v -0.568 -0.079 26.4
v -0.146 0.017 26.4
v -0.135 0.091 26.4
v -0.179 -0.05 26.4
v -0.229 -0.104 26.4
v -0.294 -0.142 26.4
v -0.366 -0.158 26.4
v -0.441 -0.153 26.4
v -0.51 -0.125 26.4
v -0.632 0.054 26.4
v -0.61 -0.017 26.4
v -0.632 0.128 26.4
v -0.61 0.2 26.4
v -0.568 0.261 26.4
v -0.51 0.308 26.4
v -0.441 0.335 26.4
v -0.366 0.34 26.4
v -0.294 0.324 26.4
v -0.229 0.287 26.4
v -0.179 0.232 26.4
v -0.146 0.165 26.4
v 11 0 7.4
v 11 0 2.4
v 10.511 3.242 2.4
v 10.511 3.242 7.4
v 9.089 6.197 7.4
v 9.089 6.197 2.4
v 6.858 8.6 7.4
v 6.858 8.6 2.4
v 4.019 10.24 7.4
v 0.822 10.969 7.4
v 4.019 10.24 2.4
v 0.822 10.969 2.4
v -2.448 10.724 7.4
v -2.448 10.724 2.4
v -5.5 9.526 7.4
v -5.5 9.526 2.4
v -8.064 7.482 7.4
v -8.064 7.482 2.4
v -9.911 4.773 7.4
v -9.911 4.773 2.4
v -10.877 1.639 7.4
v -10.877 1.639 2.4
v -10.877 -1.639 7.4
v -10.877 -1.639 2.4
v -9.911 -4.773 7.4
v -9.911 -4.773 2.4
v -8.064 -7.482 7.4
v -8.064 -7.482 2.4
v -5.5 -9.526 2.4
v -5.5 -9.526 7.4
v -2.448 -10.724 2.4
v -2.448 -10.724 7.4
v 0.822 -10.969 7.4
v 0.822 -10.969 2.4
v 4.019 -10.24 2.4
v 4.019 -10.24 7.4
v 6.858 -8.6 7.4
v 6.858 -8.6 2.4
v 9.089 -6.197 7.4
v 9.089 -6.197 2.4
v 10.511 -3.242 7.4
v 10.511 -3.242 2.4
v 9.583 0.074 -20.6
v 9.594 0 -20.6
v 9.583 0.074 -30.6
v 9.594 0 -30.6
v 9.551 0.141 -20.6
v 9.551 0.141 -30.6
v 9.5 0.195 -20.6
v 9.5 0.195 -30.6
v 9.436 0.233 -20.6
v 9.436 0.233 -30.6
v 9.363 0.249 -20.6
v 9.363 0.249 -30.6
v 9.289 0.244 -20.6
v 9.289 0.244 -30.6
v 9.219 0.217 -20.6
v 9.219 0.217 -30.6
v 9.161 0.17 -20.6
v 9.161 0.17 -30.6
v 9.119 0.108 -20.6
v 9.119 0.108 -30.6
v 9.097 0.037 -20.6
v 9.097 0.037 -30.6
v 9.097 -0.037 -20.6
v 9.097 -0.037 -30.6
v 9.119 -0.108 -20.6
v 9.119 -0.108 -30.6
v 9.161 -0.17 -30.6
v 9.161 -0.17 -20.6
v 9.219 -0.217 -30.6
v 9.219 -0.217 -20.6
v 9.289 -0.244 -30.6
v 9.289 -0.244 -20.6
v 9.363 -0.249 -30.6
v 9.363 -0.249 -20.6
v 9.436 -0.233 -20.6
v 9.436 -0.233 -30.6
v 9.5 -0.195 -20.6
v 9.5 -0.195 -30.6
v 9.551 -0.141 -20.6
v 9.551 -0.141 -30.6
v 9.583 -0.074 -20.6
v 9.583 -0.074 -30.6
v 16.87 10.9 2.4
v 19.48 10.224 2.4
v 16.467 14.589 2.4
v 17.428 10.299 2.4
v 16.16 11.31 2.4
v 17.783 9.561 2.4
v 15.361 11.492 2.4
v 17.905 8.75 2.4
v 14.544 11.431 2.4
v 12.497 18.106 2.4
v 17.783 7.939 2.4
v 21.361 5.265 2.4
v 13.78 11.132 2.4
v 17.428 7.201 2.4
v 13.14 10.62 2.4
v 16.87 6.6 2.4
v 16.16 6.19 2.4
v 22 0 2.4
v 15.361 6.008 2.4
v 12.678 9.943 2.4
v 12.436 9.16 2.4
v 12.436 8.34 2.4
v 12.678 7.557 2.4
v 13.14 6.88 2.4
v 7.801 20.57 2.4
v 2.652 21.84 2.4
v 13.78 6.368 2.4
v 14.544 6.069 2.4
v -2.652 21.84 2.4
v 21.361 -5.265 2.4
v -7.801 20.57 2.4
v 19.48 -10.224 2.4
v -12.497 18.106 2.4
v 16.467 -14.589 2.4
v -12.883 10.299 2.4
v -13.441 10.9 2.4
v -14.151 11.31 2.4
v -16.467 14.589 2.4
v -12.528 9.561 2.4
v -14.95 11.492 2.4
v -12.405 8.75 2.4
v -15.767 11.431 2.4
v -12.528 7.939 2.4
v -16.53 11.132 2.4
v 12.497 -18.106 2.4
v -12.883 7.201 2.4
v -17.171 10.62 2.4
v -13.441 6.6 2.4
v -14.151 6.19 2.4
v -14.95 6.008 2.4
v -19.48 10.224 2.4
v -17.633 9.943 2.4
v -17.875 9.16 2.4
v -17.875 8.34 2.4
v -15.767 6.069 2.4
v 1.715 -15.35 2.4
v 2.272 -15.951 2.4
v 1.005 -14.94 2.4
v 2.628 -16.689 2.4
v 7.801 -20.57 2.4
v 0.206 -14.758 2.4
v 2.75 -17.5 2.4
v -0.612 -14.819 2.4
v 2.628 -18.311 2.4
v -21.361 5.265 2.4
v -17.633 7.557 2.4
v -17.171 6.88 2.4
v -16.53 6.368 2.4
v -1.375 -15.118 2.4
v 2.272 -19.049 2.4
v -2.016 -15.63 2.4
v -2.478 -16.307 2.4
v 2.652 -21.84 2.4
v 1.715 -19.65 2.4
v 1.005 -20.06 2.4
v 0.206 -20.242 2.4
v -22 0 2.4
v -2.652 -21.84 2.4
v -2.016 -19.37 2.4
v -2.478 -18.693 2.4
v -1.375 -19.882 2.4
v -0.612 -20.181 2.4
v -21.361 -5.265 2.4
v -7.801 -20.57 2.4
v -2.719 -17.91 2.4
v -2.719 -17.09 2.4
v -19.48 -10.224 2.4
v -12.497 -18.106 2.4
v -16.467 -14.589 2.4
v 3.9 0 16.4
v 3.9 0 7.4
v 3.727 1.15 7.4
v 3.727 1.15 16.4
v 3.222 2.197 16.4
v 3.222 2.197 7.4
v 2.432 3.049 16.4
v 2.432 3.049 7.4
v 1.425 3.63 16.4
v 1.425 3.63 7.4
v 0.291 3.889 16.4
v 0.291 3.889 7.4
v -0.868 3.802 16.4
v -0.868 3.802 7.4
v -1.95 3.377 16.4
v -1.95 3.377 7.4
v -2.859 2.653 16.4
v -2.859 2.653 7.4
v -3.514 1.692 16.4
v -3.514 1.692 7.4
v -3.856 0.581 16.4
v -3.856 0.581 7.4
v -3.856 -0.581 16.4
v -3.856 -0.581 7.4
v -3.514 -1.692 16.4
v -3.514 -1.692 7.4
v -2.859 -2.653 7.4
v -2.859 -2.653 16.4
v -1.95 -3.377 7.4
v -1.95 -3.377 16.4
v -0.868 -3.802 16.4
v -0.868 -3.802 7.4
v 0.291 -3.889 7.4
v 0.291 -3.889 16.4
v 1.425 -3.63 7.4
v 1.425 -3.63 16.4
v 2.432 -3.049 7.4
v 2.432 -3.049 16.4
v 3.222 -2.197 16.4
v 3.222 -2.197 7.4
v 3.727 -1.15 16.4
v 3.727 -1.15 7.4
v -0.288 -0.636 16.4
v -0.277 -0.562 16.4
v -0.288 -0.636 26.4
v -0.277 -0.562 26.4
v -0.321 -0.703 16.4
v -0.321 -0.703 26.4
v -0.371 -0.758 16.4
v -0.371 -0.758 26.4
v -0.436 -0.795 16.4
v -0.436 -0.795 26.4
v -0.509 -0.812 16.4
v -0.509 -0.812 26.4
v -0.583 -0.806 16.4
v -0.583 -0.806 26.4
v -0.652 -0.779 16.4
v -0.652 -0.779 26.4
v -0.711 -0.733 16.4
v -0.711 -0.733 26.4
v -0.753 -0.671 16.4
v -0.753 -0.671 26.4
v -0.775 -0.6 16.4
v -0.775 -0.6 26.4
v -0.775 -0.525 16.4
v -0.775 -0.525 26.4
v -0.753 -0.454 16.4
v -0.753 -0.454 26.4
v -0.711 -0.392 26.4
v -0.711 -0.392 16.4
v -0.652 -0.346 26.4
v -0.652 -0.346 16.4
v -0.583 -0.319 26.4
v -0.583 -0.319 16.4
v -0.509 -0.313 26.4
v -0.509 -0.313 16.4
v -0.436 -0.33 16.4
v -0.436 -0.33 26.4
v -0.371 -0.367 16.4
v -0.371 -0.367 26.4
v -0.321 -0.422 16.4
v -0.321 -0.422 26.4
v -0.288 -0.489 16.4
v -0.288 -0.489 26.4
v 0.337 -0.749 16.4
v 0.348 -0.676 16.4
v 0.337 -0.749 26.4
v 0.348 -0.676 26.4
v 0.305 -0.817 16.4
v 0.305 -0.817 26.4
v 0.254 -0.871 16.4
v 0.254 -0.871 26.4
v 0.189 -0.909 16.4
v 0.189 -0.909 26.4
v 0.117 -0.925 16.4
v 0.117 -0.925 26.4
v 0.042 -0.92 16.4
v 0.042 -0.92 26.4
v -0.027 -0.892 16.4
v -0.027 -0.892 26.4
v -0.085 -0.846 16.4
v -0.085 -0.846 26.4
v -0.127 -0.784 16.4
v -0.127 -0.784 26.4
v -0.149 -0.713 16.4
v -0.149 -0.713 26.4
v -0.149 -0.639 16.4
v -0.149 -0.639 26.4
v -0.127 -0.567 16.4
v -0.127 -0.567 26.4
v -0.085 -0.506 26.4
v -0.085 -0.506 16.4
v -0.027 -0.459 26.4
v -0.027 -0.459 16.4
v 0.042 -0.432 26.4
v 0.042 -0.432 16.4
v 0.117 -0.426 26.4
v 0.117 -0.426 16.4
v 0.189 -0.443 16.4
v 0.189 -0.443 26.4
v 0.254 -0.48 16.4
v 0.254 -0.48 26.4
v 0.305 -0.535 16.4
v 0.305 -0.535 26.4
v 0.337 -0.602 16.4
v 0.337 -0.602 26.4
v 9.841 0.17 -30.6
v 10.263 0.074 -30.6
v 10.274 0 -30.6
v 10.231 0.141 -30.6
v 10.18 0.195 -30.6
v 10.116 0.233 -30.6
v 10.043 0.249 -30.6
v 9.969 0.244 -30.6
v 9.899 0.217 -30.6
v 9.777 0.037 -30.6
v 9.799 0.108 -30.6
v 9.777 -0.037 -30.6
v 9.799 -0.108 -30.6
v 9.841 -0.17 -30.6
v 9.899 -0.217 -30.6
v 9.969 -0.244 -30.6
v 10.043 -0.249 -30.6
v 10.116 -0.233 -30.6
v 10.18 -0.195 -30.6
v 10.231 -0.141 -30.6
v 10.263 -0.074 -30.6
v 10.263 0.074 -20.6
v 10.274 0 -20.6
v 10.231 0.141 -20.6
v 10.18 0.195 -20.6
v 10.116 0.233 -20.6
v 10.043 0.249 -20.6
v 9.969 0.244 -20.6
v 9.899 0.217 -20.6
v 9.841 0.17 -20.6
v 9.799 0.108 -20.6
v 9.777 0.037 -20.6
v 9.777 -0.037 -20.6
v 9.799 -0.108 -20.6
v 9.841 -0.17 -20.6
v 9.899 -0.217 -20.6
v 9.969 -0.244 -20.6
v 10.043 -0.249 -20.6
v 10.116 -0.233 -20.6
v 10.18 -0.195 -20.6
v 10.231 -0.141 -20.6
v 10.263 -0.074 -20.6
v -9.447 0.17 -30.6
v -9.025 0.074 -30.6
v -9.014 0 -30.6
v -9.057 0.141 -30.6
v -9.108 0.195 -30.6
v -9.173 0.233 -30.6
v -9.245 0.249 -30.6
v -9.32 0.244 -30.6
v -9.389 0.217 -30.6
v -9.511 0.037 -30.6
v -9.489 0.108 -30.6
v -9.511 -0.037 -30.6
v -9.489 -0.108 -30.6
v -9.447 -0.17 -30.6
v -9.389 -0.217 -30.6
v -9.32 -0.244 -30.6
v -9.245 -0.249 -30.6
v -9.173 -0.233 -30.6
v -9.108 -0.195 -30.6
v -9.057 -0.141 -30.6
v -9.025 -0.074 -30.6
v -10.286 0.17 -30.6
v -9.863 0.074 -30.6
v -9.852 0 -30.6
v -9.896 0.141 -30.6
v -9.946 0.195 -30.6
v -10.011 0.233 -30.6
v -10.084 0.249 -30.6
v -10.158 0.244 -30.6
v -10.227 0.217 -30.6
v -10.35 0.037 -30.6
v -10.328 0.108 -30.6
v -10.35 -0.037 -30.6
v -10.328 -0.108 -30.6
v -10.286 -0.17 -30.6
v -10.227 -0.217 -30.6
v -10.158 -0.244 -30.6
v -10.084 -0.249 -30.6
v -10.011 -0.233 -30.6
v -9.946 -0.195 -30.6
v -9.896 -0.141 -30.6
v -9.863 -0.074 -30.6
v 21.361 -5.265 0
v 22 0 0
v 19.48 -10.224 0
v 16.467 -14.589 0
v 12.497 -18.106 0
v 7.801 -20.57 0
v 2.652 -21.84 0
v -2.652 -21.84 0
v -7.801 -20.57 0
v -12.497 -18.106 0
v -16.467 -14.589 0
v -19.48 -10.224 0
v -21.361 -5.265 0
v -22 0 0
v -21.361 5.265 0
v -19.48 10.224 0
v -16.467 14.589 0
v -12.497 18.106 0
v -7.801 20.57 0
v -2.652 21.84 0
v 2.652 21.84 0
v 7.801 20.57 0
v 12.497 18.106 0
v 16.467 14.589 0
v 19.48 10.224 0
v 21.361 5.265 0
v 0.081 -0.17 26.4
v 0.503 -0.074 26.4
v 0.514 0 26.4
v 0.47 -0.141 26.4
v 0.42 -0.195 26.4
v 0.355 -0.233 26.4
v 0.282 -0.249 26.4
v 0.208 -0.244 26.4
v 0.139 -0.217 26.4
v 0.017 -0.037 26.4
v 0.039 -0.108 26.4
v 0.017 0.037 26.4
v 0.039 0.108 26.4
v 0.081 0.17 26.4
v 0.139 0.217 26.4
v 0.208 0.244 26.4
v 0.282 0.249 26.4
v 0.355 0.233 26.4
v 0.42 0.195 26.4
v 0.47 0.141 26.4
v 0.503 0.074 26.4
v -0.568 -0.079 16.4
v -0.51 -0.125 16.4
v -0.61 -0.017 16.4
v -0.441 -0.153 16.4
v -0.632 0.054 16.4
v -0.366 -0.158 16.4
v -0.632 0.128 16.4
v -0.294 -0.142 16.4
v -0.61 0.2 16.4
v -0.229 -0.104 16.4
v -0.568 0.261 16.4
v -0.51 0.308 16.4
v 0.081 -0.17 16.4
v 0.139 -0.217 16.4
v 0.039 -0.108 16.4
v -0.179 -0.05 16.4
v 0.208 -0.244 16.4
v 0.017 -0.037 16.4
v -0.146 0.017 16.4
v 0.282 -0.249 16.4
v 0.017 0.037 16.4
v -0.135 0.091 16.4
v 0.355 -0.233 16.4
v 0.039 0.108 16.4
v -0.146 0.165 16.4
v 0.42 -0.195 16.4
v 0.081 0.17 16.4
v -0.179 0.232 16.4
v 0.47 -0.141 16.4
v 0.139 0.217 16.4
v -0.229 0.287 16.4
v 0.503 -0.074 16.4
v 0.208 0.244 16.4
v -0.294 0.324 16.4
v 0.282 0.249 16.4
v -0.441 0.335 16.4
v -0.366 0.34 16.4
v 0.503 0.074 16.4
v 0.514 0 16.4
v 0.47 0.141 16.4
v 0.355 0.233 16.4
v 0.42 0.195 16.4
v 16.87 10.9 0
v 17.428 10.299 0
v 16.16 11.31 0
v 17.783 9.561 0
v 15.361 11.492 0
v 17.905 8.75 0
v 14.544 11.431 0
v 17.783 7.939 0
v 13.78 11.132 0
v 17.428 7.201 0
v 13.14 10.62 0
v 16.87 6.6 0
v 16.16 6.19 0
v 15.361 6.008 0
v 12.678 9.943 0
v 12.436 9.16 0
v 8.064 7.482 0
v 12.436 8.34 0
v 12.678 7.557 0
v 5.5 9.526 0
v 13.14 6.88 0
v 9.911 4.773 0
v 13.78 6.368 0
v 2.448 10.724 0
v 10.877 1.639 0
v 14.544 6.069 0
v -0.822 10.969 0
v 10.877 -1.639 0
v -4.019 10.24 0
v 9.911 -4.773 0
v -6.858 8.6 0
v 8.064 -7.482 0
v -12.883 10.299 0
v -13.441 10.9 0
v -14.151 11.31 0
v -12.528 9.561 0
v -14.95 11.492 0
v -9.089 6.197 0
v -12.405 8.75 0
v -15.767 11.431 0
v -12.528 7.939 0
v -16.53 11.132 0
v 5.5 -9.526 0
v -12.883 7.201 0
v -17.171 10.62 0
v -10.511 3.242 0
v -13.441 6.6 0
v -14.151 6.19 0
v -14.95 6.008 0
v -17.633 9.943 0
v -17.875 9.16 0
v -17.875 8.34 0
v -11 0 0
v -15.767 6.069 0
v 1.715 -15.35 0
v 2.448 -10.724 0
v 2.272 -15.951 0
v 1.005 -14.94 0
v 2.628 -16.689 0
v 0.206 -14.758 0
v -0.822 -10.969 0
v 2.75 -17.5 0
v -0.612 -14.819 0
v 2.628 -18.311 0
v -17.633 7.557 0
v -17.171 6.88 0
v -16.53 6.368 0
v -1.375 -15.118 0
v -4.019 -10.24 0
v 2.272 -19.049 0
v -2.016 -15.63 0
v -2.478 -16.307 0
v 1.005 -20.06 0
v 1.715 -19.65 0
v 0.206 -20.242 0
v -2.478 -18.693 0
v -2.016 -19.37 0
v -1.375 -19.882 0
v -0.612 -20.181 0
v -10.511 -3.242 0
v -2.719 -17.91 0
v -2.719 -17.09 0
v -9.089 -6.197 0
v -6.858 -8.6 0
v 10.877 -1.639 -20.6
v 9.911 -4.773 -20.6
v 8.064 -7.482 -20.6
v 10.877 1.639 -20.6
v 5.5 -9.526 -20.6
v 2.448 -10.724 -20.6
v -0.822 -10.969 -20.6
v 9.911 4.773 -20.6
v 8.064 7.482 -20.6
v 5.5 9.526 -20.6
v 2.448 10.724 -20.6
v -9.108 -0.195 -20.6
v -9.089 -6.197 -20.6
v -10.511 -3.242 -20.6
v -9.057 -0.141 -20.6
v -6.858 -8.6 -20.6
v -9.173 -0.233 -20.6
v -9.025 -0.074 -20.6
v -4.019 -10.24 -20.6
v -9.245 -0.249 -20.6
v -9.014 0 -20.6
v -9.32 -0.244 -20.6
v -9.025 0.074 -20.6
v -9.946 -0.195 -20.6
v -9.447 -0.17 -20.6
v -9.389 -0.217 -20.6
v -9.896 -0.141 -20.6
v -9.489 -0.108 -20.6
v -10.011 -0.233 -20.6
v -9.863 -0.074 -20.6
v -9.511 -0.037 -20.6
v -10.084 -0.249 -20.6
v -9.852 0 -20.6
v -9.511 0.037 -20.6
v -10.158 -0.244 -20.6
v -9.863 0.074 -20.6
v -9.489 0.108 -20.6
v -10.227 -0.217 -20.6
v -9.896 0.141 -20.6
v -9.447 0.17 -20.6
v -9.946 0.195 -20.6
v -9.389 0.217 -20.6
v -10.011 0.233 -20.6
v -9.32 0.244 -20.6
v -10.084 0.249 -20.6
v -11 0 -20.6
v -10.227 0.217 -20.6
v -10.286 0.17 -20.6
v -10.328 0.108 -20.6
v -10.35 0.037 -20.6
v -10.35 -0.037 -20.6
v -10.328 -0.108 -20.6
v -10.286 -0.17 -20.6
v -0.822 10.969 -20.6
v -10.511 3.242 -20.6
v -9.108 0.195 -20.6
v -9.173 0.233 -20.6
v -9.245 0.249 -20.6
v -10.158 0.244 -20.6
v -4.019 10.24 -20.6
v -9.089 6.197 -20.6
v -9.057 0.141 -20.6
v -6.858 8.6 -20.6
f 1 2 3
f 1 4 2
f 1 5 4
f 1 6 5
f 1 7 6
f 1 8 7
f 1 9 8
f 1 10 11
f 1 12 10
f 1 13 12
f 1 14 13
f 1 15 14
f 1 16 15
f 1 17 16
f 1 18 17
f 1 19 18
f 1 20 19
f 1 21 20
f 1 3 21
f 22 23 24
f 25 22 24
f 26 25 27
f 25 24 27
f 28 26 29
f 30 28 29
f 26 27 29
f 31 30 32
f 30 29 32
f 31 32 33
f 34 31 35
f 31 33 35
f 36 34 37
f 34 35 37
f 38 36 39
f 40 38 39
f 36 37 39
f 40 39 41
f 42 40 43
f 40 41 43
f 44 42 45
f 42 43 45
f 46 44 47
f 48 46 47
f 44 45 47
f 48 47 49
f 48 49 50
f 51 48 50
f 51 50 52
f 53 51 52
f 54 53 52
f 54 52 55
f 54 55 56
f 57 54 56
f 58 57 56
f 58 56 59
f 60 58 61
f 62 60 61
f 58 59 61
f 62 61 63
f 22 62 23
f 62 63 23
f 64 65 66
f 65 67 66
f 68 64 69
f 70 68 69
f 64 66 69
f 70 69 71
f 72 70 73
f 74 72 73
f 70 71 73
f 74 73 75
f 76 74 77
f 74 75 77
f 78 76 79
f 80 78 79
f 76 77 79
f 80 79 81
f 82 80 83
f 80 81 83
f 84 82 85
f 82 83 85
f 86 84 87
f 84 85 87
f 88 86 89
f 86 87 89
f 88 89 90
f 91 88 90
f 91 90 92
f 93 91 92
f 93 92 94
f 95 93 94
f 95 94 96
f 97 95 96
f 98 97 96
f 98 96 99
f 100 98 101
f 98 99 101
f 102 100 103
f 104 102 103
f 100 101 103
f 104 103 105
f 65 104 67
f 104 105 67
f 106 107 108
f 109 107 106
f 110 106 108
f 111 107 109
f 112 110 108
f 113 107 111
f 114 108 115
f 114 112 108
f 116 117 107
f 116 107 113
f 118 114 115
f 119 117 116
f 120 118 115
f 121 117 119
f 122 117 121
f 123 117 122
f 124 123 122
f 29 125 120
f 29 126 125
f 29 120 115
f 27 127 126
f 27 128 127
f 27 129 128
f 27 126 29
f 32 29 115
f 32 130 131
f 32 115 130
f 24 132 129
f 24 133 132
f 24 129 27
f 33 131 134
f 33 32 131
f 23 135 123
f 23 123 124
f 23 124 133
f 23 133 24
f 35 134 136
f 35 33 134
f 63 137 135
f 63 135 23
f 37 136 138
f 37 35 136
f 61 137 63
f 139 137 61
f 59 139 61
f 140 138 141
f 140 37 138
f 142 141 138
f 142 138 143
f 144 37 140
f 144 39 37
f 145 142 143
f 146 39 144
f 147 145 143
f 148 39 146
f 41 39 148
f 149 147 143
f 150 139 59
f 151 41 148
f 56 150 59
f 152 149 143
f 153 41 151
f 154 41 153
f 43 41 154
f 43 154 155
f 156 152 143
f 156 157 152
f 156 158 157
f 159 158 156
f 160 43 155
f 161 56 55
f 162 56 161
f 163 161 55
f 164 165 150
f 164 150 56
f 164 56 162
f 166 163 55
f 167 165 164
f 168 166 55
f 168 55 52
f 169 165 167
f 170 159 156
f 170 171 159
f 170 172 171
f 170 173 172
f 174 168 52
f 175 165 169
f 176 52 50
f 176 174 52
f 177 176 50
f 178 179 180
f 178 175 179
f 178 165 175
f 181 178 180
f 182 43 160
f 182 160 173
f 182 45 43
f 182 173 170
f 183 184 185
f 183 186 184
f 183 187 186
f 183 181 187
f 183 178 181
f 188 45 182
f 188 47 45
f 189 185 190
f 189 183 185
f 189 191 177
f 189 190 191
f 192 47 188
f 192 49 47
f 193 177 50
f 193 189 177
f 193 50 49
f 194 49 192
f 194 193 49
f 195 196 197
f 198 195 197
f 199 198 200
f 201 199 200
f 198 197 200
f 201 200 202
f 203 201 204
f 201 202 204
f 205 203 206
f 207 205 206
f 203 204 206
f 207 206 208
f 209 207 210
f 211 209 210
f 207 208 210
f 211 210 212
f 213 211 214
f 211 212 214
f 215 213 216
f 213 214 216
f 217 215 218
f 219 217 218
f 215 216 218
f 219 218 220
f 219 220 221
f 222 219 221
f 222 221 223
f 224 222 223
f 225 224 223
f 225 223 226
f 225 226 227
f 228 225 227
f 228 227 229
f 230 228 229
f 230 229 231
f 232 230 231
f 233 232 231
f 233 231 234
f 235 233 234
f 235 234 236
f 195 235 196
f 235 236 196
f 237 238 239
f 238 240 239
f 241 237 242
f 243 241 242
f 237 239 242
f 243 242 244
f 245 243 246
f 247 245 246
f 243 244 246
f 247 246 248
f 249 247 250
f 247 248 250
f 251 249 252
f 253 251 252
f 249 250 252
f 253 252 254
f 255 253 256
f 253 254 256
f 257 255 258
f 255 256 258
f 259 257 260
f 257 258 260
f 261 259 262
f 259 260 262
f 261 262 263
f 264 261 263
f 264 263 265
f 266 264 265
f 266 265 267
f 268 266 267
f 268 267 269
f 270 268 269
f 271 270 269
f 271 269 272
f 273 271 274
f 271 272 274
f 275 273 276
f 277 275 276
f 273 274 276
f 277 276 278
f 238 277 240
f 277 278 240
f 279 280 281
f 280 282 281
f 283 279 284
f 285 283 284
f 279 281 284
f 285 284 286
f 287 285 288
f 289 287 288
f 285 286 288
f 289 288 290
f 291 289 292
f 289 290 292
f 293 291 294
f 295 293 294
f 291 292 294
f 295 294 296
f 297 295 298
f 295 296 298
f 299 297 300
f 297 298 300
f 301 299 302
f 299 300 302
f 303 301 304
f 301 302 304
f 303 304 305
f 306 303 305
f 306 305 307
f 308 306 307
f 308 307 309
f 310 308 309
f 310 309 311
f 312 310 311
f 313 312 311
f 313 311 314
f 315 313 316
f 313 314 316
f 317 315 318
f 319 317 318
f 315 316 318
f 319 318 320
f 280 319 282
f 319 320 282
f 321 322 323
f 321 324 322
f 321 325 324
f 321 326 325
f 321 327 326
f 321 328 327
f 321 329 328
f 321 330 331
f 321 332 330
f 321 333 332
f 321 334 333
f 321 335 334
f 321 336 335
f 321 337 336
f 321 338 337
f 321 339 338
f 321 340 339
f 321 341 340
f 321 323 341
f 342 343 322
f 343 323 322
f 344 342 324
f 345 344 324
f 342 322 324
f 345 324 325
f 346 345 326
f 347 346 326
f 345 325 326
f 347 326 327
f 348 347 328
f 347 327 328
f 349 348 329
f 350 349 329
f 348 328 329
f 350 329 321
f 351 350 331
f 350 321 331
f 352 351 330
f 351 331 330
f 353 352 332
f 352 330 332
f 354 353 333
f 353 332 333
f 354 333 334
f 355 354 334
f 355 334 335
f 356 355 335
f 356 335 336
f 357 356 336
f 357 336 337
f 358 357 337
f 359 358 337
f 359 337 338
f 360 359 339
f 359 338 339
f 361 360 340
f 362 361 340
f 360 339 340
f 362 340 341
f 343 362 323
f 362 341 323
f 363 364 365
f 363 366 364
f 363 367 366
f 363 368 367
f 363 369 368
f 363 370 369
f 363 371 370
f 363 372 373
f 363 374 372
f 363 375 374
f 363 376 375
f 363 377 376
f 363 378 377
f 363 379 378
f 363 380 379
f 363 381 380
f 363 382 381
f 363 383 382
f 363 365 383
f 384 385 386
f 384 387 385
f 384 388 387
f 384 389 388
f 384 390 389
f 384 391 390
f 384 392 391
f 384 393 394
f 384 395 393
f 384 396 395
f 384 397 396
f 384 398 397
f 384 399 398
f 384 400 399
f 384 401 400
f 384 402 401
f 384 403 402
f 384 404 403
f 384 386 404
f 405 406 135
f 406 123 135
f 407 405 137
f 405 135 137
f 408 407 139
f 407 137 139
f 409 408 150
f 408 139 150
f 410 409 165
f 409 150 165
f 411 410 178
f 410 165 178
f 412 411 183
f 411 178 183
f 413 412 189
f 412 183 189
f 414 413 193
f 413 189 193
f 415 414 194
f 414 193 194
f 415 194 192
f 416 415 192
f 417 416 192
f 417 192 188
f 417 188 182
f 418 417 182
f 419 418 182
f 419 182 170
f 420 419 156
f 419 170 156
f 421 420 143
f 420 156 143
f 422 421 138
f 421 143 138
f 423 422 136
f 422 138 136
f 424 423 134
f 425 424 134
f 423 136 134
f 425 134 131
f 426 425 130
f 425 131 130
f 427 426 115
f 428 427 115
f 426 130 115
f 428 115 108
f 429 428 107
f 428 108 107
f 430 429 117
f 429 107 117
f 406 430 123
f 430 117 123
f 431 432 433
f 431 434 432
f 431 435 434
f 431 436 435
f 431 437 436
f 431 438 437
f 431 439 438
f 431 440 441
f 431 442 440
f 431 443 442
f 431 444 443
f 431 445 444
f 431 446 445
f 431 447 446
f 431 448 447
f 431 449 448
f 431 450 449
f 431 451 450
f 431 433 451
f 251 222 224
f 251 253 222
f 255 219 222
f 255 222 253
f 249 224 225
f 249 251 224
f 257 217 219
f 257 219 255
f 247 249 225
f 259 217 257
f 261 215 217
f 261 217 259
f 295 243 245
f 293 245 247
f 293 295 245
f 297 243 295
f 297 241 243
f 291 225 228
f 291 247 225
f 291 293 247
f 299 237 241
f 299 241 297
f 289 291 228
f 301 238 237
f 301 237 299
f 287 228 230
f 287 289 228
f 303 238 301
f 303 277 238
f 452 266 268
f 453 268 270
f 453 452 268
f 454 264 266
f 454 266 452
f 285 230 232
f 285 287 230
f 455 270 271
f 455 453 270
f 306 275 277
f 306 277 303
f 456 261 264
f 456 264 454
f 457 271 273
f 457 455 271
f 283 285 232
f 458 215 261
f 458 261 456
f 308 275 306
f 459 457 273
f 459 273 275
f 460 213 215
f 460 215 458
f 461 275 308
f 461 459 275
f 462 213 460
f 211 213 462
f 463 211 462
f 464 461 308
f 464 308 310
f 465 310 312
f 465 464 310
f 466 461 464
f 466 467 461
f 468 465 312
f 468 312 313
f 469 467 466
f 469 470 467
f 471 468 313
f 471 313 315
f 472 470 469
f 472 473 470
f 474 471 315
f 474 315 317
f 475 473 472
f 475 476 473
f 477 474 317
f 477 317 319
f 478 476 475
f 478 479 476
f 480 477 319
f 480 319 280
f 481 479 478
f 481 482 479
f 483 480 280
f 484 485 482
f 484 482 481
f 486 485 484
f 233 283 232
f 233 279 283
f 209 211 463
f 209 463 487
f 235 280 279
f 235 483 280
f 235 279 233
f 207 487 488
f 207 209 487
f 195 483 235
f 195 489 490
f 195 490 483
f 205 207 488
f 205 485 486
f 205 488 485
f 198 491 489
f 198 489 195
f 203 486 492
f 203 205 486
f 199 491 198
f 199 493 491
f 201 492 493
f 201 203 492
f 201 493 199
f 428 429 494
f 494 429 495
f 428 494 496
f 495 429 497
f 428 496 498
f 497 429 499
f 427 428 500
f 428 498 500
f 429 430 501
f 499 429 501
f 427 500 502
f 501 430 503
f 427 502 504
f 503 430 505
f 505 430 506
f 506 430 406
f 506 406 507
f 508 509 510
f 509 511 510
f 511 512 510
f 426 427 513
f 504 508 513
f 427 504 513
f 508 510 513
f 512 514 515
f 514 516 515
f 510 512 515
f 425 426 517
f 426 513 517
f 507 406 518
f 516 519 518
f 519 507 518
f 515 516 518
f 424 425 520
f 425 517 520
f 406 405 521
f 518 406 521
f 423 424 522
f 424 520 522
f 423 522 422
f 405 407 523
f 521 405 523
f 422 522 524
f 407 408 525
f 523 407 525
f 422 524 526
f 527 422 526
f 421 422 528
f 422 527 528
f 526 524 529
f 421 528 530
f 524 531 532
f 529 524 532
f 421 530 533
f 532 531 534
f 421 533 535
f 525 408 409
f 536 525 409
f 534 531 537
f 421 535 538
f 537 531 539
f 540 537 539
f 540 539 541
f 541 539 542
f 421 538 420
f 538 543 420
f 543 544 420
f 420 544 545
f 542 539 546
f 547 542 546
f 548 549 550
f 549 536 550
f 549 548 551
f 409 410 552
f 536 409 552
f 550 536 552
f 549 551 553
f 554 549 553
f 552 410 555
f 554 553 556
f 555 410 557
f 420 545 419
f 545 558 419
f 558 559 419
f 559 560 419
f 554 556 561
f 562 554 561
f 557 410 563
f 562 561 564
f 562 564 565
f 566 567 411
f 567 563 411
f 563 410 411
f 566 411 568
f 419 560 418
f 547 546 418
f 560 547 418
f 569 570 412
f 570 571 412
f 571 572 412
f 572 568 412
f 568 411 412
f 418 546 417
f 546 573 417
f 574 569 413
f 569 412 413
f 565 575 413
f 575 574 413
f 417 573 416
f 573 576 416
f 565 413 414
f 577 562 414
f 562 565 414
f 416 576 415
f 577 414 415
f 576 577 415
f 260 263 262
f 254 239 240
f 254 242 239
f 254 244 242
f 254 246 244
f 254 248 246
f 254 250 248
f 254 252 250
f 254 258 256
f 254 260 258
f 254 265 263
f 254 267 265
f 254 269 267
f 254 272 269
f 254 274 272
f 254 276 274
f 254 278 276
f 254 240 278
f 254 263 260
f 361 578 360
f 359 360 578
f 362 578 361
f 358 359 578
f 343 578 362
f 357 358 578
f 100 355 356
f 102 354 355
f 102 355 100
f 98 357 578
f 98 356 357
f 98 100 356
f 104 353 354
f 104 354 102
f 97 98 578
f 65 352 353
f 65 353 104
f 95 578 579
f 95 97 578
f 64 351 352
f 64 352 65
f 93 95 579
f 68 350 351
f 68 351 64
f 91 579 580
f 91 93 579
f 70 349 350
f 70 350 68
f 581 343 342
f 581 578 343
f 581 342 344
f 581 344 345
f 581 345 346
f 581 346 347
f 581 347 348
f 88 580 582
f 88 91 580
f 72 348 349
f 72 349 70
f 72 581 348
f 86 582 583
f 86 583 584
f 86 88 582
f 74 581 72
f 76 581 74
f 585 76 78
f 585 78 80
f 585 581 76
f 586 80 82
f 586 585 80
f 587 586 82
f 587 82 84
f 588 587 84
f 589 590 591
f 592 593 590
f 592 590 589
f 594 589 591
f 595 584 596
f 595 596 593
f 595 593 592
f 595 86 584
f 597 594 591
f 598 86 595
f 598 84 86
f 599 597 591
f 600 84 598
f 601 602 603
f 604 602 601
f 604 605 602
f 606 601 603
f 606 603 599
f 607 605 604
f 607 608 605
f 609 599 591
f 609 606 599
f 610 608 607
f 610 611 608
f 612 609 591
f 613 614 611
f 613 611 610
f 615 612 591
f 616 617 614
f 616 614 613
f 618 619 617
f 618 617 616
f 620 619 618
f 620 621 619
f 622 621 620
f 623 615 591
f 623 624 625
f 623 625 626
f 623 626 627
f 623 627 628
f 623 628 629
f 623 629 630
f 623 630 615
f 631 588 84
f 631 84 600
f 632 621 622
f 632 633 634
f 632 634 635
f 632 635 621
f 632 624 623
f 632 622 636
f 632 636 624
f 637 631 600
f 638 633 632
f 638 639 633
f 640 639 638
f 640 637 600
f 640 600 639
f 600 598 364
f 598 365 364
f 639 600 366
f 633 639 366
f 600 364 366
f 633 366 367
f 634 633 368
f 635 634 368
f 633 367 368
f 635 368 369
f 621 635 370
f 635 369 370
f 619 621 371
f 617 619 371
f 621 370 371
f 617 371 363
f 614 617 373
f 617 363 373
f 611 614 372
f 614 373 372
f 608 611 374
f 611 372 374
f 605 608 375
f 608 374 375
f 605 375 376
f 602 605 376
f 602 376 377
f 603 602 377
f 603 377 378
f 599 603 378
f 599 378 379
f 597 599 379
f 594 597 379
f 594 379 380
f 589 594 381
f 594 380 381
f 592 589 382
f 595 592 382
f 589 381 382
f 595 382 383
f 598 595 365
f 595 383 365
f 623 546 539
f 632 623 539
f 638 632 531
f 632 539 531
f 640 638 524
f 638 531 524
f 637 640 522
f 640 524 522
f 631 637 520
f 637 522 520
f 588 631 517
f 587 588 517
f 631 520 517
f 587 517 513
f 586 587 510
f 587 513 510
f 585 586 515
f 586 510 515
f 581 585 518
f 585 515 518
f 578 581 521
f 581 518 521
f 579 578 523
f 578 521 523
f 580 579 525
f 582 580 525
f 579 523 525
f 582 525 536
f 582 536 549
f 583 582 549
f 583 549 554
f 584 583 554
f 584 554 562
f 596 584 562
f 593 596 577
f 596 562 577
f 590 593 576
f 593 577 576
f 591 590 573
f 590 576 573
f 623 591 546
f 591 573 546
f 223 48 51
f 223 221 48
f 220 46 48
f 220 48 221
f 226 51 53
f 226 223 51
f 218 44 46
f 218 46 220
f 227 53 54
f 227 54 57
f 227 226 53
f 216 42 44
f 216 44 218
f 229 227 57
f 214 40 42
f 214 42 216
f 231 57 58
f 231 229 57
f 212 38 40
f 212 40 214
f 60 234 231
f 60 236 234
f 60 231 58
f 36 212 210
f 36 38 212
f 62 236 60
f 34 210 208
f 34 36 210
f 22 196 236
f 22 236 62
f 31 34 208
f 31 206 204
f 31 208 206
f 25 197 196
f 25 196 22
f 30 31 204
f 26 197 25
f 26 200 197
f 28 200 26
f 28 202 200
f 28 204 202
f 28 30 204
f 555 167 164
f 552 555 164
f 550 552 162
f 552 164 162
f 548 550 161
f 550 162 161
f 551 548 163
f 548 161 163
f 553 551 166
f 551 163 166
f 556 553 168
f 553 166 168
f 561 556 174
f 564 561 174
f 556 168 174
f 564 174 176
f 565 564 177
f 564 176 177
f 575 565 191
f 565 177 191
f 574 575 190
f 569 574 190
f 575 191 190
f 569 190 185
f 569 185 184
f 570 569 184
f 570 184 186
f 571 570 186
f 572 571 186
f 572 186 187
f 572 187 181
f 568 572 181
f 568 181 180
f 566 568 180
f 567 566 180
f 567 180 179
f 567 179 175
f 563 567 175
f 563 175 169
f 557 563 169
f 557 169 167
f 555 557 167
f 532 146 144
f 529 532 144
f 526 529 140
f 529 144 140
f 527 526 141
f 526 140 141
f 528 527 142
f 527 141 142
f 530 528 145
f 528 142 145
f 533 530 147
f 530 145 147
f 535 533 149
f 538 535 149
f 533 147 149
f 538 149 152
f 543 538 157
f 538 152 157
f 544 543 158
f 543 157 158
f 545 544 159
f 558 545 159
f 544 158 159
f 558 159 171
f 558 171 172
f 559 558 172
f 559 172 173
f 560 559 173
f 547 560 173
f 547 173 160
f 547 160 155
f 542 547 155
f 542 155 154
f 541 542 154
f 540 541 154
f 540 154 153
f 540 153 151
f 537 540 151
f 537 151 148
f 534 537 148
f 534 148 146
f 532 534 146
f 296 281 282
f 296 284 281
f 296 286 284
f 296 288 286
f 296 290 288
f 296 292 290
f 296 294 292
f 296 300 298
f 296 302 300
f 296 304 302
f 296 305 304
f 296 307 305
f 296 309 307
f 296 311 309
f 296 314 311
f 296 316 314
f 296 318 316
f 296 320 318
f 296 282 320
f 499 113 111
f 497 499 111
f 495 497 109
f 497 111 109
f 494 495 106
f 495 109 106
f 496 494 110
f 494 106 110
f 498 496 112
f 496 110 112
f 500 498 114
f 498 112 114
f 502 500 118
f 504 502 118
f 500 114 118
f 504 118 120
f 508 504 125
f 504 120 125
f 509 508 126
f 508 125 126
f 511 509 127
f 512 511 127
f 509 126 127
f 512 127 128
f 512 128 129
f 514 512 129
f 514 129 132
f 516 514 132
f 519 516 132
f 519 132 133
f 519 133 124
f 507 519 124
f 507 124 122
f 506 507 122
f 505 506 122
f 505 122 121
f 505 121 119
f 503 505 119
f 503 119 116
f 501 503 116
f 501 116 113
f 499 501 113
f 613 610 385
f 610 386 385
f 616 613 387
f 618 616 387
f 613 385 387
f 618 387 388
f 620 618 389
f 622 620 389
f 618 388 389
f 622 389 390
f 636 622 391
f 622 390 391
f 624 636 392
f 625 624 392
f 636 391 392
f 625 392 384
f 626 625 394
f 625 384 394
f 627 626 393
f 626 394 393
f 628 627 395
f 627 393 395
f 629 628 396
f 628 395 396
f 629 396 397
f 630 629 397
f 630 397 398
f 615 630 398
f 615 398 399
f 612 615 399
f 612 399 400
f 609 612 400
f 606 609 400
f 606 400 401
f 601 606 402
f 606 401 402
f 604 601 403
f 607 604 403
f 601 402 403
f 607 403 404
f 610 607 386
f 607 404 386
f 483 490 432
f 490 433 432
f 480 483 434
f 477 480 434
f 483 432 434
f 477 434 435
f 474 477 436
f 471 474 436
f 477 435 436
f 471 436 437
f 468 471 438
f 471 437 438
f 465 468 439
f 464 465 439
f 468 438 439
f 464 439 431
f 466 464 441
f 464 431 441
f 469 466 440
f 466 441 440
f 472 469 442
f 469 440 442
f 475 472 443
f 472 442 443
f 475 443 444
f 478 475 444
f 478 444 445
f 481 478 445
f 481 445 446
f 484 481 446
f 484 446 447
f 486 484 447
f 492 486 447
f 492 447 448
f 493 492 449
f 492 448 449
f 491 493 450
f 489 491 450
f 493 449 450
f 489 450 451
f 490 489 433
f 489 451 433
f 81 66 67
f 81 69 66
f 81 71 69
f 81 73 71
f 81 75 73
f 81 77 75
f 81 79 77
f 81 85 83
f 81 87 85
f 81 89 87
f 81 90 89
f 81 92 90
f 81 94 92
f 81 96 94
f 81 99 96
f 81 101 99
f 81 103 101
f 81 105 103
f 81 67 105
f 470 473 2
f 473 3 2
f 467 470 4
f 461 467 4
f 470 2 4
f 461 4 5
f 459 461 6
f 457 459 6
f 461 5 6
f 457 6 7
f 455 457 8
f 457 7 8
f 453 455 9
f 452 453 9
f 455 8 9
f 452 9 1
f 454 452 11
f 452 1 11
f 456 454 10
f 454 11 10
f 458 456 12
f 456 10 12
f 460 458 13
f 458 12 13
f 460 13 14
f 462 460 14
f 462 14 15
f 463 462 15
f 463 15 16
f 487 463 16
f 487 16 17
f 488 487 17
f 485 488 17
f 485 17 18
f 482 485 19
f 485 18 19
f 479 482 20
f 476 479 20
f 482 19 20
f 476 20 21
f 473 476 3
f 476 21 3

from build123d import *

# Parameters (mm, degrees)
SKETCH1_W                      = 22
SKETCH1_H                      = 2.4
SKETCH2_R                      = 11
BOSS_EXTRUDE1_DEPTH            = 5
SKETCH3_R                      = 3.9
BOSS_EXTRUDE2_DEPTH            = 9
SKETCH4_R                      = 11
BOSS_EXTRUDE3_DEPTH            = 20.6
SKETCH5_W                      = 0.25
SKETCH5_H                      = 10
SKETCH6_W                      = 0.25
SKETCH6_H                      = 10
SKETCH7_W                      = 0.25
SKETCH7_H                      = 10
SKETCH8_W                      = 0.25
SKETCH8_H                      = 10
SKETCH9_W                      = 0.25
SKETCH9_H                      = 10
SKETCH10_W                     = 0.25
SKETCH10_H                     = 10
SKETCH11_W                     = 0.25
SKETCH11_H                     = 10
SKETCH12_W                     = 0.25
SKETCH12_H                     = 10
F_5_5_5_5_DIAMETER_HOLE1_D     = 5.5
F_5_5_5_5_DIAMETER_HOLE1_DEPTH = 26.4


with BuildPart() as part:
    # Sketch1 → Revolve1 (revolve)
    with BuildSketch(Plane.XZ):
        with Locations((11, 1.2)):
            Rectangle(SKETCH1_W, SKETCH1_H)
    revolve(axis=Axis((0, 0, 2.4), (0, 0, -1)))

    # Sketch2 → Boss-Extrude1 (add)
    with BuildSketch(Plane.XY.offset(2.4)):
        Circle(SKETCH2_R)
    extrude(amount=BOSS_EXTRUDE1_DEPTH)

    # Sketch3 → Boss-Extrude2 (add)
    with BuildSketch(Plane.XY.offset(7.4)):
        Circle(SKETCH3_R)
    extrude(amount=BOSS_EXTRUDE2_DEPTH)

    # Sketch4 → Boss-Extrude3 (add)
    with BuildSketch(Plane(origin=(0, 0, 0), x_dir=(-1, 0, 0), z_dir=(0, 0, -1))):
        Circle(SKETCH4_R)
    extrude(amount=BOSS_EXTRUDE3_DEPTH)

    # Sketch5 → Revolve2 (revolve)
    with BuildSketch(Plane.XZ.offset(0.675788748)):
        with Locations((0.22311943, 21.4)):
            Rectangle(SKETCH5_W, SKETCH5_H)
    revolve(axis=Axis((0.09811943, -0.675788748, 26.4), (0, 0, -1)))

    # Sketch6 → Revolve3 (revolve)
    with BuildSketch(Plane.XZ.offset(-0.091161083)):
        with Locations((-0.260169312, 21.4)):
            Rectangle(SKETCH6_W, SKETCH6_H)
    revolve(axis=Axis((-0.385169312, 0.091161083, 26.4), (0, 0, -1)))

    # Sketch7 → Revolve4 (revolve)
    with BuildSketch(Plane.XZ.offset(0.562471217)):
        with Locations((-0.402355812, 21.4)):
            Rectangle(SKETCH7_W, SKETCH7_H)
    revolve(axis=Axis((-0.527355812, -0.562471217, 26.4), (0, 0, -1)))

    # Sketch8 → Revolve5 (revolve)
    with BuildSketch(Plane(origin=(0, 0, 0), x_dir=(1, 0, 0), z_dir=(0, 1, 0))):
        with Locations((-9.138912968, 25.6)):
            Rectangle(SKETCH8_W, SKETCH8_H)
    revolve(axis=Axis((-9.263912968, 0, -30.6), (0, 0, 1)))

    # Sketch9 → Revolve6 (revolve)
    with BuildSketch(Plane(origin=(0, 0, 0), x_dir=(1, 0, 0), z_dir=(0, 1, 0))):
        with Locations((10.149169803, 25.6)):
            Rectangle(SKETCH9_W, SKETCH9_H)
    revolve(axis=Axis((10.024169803, 0, -30.6), (0, 0, 1)))

    # Sketch10 → Revolve7 (revolve)
    with BuildSketch(Plane(origin=(0, 0, 0), x_dir=(1, 0, 0), z_dir=(0, 1, 0))):
        with Locations((9.469293537, 25.6)):
            Rectangle(SKETCH10_W, SKETCH10_H)
    revolve(axis=Axis((9.344293537, 0, -30.6), (0, 0, 1)))

    # Sketch11 → Revolve8 (revolve)
    with BuildSketch(Plane(origin=(0, 0, 0), x_dir=(1, 0, 0), z_dir=(0, 1, 0))):
        with Locations((-9.977336314, 25.6)):
            Rectangle(SKETCH11_W, SKETCH11_H)
    revolve(axis=Axis((-10.102336314, 0, -30.6), (0, 0, 1)))

    # Sketch12 → Revolve9 (revolve)
    with BuildSketch(Plane.XZ):
        with Locations((0.388776295, 21.4)):
            Rectangle(SKETCH12_W, SKETCH12_H)
    revolve(axis=Axis((0.263776295, 0, 26.4), (0, 0, -1)))

    # Ø5.5 (5.5) Diameter Hole1
    with Locations(Plane(origin=(0, 0, 0), x_dir=(-1, 0, 0), z_dir=(0, 0, -1))):
        with Locations((-15.155444566, 8.75), (15.155444566, 8.75), (0, -17.5)):
            Hole(F_5_5_5_5_DIAMETER_HOLE1_D / 2, depth=F_5_5_5_5_DIAMETER_HOLE1_DEPTH)


solid = part.part
